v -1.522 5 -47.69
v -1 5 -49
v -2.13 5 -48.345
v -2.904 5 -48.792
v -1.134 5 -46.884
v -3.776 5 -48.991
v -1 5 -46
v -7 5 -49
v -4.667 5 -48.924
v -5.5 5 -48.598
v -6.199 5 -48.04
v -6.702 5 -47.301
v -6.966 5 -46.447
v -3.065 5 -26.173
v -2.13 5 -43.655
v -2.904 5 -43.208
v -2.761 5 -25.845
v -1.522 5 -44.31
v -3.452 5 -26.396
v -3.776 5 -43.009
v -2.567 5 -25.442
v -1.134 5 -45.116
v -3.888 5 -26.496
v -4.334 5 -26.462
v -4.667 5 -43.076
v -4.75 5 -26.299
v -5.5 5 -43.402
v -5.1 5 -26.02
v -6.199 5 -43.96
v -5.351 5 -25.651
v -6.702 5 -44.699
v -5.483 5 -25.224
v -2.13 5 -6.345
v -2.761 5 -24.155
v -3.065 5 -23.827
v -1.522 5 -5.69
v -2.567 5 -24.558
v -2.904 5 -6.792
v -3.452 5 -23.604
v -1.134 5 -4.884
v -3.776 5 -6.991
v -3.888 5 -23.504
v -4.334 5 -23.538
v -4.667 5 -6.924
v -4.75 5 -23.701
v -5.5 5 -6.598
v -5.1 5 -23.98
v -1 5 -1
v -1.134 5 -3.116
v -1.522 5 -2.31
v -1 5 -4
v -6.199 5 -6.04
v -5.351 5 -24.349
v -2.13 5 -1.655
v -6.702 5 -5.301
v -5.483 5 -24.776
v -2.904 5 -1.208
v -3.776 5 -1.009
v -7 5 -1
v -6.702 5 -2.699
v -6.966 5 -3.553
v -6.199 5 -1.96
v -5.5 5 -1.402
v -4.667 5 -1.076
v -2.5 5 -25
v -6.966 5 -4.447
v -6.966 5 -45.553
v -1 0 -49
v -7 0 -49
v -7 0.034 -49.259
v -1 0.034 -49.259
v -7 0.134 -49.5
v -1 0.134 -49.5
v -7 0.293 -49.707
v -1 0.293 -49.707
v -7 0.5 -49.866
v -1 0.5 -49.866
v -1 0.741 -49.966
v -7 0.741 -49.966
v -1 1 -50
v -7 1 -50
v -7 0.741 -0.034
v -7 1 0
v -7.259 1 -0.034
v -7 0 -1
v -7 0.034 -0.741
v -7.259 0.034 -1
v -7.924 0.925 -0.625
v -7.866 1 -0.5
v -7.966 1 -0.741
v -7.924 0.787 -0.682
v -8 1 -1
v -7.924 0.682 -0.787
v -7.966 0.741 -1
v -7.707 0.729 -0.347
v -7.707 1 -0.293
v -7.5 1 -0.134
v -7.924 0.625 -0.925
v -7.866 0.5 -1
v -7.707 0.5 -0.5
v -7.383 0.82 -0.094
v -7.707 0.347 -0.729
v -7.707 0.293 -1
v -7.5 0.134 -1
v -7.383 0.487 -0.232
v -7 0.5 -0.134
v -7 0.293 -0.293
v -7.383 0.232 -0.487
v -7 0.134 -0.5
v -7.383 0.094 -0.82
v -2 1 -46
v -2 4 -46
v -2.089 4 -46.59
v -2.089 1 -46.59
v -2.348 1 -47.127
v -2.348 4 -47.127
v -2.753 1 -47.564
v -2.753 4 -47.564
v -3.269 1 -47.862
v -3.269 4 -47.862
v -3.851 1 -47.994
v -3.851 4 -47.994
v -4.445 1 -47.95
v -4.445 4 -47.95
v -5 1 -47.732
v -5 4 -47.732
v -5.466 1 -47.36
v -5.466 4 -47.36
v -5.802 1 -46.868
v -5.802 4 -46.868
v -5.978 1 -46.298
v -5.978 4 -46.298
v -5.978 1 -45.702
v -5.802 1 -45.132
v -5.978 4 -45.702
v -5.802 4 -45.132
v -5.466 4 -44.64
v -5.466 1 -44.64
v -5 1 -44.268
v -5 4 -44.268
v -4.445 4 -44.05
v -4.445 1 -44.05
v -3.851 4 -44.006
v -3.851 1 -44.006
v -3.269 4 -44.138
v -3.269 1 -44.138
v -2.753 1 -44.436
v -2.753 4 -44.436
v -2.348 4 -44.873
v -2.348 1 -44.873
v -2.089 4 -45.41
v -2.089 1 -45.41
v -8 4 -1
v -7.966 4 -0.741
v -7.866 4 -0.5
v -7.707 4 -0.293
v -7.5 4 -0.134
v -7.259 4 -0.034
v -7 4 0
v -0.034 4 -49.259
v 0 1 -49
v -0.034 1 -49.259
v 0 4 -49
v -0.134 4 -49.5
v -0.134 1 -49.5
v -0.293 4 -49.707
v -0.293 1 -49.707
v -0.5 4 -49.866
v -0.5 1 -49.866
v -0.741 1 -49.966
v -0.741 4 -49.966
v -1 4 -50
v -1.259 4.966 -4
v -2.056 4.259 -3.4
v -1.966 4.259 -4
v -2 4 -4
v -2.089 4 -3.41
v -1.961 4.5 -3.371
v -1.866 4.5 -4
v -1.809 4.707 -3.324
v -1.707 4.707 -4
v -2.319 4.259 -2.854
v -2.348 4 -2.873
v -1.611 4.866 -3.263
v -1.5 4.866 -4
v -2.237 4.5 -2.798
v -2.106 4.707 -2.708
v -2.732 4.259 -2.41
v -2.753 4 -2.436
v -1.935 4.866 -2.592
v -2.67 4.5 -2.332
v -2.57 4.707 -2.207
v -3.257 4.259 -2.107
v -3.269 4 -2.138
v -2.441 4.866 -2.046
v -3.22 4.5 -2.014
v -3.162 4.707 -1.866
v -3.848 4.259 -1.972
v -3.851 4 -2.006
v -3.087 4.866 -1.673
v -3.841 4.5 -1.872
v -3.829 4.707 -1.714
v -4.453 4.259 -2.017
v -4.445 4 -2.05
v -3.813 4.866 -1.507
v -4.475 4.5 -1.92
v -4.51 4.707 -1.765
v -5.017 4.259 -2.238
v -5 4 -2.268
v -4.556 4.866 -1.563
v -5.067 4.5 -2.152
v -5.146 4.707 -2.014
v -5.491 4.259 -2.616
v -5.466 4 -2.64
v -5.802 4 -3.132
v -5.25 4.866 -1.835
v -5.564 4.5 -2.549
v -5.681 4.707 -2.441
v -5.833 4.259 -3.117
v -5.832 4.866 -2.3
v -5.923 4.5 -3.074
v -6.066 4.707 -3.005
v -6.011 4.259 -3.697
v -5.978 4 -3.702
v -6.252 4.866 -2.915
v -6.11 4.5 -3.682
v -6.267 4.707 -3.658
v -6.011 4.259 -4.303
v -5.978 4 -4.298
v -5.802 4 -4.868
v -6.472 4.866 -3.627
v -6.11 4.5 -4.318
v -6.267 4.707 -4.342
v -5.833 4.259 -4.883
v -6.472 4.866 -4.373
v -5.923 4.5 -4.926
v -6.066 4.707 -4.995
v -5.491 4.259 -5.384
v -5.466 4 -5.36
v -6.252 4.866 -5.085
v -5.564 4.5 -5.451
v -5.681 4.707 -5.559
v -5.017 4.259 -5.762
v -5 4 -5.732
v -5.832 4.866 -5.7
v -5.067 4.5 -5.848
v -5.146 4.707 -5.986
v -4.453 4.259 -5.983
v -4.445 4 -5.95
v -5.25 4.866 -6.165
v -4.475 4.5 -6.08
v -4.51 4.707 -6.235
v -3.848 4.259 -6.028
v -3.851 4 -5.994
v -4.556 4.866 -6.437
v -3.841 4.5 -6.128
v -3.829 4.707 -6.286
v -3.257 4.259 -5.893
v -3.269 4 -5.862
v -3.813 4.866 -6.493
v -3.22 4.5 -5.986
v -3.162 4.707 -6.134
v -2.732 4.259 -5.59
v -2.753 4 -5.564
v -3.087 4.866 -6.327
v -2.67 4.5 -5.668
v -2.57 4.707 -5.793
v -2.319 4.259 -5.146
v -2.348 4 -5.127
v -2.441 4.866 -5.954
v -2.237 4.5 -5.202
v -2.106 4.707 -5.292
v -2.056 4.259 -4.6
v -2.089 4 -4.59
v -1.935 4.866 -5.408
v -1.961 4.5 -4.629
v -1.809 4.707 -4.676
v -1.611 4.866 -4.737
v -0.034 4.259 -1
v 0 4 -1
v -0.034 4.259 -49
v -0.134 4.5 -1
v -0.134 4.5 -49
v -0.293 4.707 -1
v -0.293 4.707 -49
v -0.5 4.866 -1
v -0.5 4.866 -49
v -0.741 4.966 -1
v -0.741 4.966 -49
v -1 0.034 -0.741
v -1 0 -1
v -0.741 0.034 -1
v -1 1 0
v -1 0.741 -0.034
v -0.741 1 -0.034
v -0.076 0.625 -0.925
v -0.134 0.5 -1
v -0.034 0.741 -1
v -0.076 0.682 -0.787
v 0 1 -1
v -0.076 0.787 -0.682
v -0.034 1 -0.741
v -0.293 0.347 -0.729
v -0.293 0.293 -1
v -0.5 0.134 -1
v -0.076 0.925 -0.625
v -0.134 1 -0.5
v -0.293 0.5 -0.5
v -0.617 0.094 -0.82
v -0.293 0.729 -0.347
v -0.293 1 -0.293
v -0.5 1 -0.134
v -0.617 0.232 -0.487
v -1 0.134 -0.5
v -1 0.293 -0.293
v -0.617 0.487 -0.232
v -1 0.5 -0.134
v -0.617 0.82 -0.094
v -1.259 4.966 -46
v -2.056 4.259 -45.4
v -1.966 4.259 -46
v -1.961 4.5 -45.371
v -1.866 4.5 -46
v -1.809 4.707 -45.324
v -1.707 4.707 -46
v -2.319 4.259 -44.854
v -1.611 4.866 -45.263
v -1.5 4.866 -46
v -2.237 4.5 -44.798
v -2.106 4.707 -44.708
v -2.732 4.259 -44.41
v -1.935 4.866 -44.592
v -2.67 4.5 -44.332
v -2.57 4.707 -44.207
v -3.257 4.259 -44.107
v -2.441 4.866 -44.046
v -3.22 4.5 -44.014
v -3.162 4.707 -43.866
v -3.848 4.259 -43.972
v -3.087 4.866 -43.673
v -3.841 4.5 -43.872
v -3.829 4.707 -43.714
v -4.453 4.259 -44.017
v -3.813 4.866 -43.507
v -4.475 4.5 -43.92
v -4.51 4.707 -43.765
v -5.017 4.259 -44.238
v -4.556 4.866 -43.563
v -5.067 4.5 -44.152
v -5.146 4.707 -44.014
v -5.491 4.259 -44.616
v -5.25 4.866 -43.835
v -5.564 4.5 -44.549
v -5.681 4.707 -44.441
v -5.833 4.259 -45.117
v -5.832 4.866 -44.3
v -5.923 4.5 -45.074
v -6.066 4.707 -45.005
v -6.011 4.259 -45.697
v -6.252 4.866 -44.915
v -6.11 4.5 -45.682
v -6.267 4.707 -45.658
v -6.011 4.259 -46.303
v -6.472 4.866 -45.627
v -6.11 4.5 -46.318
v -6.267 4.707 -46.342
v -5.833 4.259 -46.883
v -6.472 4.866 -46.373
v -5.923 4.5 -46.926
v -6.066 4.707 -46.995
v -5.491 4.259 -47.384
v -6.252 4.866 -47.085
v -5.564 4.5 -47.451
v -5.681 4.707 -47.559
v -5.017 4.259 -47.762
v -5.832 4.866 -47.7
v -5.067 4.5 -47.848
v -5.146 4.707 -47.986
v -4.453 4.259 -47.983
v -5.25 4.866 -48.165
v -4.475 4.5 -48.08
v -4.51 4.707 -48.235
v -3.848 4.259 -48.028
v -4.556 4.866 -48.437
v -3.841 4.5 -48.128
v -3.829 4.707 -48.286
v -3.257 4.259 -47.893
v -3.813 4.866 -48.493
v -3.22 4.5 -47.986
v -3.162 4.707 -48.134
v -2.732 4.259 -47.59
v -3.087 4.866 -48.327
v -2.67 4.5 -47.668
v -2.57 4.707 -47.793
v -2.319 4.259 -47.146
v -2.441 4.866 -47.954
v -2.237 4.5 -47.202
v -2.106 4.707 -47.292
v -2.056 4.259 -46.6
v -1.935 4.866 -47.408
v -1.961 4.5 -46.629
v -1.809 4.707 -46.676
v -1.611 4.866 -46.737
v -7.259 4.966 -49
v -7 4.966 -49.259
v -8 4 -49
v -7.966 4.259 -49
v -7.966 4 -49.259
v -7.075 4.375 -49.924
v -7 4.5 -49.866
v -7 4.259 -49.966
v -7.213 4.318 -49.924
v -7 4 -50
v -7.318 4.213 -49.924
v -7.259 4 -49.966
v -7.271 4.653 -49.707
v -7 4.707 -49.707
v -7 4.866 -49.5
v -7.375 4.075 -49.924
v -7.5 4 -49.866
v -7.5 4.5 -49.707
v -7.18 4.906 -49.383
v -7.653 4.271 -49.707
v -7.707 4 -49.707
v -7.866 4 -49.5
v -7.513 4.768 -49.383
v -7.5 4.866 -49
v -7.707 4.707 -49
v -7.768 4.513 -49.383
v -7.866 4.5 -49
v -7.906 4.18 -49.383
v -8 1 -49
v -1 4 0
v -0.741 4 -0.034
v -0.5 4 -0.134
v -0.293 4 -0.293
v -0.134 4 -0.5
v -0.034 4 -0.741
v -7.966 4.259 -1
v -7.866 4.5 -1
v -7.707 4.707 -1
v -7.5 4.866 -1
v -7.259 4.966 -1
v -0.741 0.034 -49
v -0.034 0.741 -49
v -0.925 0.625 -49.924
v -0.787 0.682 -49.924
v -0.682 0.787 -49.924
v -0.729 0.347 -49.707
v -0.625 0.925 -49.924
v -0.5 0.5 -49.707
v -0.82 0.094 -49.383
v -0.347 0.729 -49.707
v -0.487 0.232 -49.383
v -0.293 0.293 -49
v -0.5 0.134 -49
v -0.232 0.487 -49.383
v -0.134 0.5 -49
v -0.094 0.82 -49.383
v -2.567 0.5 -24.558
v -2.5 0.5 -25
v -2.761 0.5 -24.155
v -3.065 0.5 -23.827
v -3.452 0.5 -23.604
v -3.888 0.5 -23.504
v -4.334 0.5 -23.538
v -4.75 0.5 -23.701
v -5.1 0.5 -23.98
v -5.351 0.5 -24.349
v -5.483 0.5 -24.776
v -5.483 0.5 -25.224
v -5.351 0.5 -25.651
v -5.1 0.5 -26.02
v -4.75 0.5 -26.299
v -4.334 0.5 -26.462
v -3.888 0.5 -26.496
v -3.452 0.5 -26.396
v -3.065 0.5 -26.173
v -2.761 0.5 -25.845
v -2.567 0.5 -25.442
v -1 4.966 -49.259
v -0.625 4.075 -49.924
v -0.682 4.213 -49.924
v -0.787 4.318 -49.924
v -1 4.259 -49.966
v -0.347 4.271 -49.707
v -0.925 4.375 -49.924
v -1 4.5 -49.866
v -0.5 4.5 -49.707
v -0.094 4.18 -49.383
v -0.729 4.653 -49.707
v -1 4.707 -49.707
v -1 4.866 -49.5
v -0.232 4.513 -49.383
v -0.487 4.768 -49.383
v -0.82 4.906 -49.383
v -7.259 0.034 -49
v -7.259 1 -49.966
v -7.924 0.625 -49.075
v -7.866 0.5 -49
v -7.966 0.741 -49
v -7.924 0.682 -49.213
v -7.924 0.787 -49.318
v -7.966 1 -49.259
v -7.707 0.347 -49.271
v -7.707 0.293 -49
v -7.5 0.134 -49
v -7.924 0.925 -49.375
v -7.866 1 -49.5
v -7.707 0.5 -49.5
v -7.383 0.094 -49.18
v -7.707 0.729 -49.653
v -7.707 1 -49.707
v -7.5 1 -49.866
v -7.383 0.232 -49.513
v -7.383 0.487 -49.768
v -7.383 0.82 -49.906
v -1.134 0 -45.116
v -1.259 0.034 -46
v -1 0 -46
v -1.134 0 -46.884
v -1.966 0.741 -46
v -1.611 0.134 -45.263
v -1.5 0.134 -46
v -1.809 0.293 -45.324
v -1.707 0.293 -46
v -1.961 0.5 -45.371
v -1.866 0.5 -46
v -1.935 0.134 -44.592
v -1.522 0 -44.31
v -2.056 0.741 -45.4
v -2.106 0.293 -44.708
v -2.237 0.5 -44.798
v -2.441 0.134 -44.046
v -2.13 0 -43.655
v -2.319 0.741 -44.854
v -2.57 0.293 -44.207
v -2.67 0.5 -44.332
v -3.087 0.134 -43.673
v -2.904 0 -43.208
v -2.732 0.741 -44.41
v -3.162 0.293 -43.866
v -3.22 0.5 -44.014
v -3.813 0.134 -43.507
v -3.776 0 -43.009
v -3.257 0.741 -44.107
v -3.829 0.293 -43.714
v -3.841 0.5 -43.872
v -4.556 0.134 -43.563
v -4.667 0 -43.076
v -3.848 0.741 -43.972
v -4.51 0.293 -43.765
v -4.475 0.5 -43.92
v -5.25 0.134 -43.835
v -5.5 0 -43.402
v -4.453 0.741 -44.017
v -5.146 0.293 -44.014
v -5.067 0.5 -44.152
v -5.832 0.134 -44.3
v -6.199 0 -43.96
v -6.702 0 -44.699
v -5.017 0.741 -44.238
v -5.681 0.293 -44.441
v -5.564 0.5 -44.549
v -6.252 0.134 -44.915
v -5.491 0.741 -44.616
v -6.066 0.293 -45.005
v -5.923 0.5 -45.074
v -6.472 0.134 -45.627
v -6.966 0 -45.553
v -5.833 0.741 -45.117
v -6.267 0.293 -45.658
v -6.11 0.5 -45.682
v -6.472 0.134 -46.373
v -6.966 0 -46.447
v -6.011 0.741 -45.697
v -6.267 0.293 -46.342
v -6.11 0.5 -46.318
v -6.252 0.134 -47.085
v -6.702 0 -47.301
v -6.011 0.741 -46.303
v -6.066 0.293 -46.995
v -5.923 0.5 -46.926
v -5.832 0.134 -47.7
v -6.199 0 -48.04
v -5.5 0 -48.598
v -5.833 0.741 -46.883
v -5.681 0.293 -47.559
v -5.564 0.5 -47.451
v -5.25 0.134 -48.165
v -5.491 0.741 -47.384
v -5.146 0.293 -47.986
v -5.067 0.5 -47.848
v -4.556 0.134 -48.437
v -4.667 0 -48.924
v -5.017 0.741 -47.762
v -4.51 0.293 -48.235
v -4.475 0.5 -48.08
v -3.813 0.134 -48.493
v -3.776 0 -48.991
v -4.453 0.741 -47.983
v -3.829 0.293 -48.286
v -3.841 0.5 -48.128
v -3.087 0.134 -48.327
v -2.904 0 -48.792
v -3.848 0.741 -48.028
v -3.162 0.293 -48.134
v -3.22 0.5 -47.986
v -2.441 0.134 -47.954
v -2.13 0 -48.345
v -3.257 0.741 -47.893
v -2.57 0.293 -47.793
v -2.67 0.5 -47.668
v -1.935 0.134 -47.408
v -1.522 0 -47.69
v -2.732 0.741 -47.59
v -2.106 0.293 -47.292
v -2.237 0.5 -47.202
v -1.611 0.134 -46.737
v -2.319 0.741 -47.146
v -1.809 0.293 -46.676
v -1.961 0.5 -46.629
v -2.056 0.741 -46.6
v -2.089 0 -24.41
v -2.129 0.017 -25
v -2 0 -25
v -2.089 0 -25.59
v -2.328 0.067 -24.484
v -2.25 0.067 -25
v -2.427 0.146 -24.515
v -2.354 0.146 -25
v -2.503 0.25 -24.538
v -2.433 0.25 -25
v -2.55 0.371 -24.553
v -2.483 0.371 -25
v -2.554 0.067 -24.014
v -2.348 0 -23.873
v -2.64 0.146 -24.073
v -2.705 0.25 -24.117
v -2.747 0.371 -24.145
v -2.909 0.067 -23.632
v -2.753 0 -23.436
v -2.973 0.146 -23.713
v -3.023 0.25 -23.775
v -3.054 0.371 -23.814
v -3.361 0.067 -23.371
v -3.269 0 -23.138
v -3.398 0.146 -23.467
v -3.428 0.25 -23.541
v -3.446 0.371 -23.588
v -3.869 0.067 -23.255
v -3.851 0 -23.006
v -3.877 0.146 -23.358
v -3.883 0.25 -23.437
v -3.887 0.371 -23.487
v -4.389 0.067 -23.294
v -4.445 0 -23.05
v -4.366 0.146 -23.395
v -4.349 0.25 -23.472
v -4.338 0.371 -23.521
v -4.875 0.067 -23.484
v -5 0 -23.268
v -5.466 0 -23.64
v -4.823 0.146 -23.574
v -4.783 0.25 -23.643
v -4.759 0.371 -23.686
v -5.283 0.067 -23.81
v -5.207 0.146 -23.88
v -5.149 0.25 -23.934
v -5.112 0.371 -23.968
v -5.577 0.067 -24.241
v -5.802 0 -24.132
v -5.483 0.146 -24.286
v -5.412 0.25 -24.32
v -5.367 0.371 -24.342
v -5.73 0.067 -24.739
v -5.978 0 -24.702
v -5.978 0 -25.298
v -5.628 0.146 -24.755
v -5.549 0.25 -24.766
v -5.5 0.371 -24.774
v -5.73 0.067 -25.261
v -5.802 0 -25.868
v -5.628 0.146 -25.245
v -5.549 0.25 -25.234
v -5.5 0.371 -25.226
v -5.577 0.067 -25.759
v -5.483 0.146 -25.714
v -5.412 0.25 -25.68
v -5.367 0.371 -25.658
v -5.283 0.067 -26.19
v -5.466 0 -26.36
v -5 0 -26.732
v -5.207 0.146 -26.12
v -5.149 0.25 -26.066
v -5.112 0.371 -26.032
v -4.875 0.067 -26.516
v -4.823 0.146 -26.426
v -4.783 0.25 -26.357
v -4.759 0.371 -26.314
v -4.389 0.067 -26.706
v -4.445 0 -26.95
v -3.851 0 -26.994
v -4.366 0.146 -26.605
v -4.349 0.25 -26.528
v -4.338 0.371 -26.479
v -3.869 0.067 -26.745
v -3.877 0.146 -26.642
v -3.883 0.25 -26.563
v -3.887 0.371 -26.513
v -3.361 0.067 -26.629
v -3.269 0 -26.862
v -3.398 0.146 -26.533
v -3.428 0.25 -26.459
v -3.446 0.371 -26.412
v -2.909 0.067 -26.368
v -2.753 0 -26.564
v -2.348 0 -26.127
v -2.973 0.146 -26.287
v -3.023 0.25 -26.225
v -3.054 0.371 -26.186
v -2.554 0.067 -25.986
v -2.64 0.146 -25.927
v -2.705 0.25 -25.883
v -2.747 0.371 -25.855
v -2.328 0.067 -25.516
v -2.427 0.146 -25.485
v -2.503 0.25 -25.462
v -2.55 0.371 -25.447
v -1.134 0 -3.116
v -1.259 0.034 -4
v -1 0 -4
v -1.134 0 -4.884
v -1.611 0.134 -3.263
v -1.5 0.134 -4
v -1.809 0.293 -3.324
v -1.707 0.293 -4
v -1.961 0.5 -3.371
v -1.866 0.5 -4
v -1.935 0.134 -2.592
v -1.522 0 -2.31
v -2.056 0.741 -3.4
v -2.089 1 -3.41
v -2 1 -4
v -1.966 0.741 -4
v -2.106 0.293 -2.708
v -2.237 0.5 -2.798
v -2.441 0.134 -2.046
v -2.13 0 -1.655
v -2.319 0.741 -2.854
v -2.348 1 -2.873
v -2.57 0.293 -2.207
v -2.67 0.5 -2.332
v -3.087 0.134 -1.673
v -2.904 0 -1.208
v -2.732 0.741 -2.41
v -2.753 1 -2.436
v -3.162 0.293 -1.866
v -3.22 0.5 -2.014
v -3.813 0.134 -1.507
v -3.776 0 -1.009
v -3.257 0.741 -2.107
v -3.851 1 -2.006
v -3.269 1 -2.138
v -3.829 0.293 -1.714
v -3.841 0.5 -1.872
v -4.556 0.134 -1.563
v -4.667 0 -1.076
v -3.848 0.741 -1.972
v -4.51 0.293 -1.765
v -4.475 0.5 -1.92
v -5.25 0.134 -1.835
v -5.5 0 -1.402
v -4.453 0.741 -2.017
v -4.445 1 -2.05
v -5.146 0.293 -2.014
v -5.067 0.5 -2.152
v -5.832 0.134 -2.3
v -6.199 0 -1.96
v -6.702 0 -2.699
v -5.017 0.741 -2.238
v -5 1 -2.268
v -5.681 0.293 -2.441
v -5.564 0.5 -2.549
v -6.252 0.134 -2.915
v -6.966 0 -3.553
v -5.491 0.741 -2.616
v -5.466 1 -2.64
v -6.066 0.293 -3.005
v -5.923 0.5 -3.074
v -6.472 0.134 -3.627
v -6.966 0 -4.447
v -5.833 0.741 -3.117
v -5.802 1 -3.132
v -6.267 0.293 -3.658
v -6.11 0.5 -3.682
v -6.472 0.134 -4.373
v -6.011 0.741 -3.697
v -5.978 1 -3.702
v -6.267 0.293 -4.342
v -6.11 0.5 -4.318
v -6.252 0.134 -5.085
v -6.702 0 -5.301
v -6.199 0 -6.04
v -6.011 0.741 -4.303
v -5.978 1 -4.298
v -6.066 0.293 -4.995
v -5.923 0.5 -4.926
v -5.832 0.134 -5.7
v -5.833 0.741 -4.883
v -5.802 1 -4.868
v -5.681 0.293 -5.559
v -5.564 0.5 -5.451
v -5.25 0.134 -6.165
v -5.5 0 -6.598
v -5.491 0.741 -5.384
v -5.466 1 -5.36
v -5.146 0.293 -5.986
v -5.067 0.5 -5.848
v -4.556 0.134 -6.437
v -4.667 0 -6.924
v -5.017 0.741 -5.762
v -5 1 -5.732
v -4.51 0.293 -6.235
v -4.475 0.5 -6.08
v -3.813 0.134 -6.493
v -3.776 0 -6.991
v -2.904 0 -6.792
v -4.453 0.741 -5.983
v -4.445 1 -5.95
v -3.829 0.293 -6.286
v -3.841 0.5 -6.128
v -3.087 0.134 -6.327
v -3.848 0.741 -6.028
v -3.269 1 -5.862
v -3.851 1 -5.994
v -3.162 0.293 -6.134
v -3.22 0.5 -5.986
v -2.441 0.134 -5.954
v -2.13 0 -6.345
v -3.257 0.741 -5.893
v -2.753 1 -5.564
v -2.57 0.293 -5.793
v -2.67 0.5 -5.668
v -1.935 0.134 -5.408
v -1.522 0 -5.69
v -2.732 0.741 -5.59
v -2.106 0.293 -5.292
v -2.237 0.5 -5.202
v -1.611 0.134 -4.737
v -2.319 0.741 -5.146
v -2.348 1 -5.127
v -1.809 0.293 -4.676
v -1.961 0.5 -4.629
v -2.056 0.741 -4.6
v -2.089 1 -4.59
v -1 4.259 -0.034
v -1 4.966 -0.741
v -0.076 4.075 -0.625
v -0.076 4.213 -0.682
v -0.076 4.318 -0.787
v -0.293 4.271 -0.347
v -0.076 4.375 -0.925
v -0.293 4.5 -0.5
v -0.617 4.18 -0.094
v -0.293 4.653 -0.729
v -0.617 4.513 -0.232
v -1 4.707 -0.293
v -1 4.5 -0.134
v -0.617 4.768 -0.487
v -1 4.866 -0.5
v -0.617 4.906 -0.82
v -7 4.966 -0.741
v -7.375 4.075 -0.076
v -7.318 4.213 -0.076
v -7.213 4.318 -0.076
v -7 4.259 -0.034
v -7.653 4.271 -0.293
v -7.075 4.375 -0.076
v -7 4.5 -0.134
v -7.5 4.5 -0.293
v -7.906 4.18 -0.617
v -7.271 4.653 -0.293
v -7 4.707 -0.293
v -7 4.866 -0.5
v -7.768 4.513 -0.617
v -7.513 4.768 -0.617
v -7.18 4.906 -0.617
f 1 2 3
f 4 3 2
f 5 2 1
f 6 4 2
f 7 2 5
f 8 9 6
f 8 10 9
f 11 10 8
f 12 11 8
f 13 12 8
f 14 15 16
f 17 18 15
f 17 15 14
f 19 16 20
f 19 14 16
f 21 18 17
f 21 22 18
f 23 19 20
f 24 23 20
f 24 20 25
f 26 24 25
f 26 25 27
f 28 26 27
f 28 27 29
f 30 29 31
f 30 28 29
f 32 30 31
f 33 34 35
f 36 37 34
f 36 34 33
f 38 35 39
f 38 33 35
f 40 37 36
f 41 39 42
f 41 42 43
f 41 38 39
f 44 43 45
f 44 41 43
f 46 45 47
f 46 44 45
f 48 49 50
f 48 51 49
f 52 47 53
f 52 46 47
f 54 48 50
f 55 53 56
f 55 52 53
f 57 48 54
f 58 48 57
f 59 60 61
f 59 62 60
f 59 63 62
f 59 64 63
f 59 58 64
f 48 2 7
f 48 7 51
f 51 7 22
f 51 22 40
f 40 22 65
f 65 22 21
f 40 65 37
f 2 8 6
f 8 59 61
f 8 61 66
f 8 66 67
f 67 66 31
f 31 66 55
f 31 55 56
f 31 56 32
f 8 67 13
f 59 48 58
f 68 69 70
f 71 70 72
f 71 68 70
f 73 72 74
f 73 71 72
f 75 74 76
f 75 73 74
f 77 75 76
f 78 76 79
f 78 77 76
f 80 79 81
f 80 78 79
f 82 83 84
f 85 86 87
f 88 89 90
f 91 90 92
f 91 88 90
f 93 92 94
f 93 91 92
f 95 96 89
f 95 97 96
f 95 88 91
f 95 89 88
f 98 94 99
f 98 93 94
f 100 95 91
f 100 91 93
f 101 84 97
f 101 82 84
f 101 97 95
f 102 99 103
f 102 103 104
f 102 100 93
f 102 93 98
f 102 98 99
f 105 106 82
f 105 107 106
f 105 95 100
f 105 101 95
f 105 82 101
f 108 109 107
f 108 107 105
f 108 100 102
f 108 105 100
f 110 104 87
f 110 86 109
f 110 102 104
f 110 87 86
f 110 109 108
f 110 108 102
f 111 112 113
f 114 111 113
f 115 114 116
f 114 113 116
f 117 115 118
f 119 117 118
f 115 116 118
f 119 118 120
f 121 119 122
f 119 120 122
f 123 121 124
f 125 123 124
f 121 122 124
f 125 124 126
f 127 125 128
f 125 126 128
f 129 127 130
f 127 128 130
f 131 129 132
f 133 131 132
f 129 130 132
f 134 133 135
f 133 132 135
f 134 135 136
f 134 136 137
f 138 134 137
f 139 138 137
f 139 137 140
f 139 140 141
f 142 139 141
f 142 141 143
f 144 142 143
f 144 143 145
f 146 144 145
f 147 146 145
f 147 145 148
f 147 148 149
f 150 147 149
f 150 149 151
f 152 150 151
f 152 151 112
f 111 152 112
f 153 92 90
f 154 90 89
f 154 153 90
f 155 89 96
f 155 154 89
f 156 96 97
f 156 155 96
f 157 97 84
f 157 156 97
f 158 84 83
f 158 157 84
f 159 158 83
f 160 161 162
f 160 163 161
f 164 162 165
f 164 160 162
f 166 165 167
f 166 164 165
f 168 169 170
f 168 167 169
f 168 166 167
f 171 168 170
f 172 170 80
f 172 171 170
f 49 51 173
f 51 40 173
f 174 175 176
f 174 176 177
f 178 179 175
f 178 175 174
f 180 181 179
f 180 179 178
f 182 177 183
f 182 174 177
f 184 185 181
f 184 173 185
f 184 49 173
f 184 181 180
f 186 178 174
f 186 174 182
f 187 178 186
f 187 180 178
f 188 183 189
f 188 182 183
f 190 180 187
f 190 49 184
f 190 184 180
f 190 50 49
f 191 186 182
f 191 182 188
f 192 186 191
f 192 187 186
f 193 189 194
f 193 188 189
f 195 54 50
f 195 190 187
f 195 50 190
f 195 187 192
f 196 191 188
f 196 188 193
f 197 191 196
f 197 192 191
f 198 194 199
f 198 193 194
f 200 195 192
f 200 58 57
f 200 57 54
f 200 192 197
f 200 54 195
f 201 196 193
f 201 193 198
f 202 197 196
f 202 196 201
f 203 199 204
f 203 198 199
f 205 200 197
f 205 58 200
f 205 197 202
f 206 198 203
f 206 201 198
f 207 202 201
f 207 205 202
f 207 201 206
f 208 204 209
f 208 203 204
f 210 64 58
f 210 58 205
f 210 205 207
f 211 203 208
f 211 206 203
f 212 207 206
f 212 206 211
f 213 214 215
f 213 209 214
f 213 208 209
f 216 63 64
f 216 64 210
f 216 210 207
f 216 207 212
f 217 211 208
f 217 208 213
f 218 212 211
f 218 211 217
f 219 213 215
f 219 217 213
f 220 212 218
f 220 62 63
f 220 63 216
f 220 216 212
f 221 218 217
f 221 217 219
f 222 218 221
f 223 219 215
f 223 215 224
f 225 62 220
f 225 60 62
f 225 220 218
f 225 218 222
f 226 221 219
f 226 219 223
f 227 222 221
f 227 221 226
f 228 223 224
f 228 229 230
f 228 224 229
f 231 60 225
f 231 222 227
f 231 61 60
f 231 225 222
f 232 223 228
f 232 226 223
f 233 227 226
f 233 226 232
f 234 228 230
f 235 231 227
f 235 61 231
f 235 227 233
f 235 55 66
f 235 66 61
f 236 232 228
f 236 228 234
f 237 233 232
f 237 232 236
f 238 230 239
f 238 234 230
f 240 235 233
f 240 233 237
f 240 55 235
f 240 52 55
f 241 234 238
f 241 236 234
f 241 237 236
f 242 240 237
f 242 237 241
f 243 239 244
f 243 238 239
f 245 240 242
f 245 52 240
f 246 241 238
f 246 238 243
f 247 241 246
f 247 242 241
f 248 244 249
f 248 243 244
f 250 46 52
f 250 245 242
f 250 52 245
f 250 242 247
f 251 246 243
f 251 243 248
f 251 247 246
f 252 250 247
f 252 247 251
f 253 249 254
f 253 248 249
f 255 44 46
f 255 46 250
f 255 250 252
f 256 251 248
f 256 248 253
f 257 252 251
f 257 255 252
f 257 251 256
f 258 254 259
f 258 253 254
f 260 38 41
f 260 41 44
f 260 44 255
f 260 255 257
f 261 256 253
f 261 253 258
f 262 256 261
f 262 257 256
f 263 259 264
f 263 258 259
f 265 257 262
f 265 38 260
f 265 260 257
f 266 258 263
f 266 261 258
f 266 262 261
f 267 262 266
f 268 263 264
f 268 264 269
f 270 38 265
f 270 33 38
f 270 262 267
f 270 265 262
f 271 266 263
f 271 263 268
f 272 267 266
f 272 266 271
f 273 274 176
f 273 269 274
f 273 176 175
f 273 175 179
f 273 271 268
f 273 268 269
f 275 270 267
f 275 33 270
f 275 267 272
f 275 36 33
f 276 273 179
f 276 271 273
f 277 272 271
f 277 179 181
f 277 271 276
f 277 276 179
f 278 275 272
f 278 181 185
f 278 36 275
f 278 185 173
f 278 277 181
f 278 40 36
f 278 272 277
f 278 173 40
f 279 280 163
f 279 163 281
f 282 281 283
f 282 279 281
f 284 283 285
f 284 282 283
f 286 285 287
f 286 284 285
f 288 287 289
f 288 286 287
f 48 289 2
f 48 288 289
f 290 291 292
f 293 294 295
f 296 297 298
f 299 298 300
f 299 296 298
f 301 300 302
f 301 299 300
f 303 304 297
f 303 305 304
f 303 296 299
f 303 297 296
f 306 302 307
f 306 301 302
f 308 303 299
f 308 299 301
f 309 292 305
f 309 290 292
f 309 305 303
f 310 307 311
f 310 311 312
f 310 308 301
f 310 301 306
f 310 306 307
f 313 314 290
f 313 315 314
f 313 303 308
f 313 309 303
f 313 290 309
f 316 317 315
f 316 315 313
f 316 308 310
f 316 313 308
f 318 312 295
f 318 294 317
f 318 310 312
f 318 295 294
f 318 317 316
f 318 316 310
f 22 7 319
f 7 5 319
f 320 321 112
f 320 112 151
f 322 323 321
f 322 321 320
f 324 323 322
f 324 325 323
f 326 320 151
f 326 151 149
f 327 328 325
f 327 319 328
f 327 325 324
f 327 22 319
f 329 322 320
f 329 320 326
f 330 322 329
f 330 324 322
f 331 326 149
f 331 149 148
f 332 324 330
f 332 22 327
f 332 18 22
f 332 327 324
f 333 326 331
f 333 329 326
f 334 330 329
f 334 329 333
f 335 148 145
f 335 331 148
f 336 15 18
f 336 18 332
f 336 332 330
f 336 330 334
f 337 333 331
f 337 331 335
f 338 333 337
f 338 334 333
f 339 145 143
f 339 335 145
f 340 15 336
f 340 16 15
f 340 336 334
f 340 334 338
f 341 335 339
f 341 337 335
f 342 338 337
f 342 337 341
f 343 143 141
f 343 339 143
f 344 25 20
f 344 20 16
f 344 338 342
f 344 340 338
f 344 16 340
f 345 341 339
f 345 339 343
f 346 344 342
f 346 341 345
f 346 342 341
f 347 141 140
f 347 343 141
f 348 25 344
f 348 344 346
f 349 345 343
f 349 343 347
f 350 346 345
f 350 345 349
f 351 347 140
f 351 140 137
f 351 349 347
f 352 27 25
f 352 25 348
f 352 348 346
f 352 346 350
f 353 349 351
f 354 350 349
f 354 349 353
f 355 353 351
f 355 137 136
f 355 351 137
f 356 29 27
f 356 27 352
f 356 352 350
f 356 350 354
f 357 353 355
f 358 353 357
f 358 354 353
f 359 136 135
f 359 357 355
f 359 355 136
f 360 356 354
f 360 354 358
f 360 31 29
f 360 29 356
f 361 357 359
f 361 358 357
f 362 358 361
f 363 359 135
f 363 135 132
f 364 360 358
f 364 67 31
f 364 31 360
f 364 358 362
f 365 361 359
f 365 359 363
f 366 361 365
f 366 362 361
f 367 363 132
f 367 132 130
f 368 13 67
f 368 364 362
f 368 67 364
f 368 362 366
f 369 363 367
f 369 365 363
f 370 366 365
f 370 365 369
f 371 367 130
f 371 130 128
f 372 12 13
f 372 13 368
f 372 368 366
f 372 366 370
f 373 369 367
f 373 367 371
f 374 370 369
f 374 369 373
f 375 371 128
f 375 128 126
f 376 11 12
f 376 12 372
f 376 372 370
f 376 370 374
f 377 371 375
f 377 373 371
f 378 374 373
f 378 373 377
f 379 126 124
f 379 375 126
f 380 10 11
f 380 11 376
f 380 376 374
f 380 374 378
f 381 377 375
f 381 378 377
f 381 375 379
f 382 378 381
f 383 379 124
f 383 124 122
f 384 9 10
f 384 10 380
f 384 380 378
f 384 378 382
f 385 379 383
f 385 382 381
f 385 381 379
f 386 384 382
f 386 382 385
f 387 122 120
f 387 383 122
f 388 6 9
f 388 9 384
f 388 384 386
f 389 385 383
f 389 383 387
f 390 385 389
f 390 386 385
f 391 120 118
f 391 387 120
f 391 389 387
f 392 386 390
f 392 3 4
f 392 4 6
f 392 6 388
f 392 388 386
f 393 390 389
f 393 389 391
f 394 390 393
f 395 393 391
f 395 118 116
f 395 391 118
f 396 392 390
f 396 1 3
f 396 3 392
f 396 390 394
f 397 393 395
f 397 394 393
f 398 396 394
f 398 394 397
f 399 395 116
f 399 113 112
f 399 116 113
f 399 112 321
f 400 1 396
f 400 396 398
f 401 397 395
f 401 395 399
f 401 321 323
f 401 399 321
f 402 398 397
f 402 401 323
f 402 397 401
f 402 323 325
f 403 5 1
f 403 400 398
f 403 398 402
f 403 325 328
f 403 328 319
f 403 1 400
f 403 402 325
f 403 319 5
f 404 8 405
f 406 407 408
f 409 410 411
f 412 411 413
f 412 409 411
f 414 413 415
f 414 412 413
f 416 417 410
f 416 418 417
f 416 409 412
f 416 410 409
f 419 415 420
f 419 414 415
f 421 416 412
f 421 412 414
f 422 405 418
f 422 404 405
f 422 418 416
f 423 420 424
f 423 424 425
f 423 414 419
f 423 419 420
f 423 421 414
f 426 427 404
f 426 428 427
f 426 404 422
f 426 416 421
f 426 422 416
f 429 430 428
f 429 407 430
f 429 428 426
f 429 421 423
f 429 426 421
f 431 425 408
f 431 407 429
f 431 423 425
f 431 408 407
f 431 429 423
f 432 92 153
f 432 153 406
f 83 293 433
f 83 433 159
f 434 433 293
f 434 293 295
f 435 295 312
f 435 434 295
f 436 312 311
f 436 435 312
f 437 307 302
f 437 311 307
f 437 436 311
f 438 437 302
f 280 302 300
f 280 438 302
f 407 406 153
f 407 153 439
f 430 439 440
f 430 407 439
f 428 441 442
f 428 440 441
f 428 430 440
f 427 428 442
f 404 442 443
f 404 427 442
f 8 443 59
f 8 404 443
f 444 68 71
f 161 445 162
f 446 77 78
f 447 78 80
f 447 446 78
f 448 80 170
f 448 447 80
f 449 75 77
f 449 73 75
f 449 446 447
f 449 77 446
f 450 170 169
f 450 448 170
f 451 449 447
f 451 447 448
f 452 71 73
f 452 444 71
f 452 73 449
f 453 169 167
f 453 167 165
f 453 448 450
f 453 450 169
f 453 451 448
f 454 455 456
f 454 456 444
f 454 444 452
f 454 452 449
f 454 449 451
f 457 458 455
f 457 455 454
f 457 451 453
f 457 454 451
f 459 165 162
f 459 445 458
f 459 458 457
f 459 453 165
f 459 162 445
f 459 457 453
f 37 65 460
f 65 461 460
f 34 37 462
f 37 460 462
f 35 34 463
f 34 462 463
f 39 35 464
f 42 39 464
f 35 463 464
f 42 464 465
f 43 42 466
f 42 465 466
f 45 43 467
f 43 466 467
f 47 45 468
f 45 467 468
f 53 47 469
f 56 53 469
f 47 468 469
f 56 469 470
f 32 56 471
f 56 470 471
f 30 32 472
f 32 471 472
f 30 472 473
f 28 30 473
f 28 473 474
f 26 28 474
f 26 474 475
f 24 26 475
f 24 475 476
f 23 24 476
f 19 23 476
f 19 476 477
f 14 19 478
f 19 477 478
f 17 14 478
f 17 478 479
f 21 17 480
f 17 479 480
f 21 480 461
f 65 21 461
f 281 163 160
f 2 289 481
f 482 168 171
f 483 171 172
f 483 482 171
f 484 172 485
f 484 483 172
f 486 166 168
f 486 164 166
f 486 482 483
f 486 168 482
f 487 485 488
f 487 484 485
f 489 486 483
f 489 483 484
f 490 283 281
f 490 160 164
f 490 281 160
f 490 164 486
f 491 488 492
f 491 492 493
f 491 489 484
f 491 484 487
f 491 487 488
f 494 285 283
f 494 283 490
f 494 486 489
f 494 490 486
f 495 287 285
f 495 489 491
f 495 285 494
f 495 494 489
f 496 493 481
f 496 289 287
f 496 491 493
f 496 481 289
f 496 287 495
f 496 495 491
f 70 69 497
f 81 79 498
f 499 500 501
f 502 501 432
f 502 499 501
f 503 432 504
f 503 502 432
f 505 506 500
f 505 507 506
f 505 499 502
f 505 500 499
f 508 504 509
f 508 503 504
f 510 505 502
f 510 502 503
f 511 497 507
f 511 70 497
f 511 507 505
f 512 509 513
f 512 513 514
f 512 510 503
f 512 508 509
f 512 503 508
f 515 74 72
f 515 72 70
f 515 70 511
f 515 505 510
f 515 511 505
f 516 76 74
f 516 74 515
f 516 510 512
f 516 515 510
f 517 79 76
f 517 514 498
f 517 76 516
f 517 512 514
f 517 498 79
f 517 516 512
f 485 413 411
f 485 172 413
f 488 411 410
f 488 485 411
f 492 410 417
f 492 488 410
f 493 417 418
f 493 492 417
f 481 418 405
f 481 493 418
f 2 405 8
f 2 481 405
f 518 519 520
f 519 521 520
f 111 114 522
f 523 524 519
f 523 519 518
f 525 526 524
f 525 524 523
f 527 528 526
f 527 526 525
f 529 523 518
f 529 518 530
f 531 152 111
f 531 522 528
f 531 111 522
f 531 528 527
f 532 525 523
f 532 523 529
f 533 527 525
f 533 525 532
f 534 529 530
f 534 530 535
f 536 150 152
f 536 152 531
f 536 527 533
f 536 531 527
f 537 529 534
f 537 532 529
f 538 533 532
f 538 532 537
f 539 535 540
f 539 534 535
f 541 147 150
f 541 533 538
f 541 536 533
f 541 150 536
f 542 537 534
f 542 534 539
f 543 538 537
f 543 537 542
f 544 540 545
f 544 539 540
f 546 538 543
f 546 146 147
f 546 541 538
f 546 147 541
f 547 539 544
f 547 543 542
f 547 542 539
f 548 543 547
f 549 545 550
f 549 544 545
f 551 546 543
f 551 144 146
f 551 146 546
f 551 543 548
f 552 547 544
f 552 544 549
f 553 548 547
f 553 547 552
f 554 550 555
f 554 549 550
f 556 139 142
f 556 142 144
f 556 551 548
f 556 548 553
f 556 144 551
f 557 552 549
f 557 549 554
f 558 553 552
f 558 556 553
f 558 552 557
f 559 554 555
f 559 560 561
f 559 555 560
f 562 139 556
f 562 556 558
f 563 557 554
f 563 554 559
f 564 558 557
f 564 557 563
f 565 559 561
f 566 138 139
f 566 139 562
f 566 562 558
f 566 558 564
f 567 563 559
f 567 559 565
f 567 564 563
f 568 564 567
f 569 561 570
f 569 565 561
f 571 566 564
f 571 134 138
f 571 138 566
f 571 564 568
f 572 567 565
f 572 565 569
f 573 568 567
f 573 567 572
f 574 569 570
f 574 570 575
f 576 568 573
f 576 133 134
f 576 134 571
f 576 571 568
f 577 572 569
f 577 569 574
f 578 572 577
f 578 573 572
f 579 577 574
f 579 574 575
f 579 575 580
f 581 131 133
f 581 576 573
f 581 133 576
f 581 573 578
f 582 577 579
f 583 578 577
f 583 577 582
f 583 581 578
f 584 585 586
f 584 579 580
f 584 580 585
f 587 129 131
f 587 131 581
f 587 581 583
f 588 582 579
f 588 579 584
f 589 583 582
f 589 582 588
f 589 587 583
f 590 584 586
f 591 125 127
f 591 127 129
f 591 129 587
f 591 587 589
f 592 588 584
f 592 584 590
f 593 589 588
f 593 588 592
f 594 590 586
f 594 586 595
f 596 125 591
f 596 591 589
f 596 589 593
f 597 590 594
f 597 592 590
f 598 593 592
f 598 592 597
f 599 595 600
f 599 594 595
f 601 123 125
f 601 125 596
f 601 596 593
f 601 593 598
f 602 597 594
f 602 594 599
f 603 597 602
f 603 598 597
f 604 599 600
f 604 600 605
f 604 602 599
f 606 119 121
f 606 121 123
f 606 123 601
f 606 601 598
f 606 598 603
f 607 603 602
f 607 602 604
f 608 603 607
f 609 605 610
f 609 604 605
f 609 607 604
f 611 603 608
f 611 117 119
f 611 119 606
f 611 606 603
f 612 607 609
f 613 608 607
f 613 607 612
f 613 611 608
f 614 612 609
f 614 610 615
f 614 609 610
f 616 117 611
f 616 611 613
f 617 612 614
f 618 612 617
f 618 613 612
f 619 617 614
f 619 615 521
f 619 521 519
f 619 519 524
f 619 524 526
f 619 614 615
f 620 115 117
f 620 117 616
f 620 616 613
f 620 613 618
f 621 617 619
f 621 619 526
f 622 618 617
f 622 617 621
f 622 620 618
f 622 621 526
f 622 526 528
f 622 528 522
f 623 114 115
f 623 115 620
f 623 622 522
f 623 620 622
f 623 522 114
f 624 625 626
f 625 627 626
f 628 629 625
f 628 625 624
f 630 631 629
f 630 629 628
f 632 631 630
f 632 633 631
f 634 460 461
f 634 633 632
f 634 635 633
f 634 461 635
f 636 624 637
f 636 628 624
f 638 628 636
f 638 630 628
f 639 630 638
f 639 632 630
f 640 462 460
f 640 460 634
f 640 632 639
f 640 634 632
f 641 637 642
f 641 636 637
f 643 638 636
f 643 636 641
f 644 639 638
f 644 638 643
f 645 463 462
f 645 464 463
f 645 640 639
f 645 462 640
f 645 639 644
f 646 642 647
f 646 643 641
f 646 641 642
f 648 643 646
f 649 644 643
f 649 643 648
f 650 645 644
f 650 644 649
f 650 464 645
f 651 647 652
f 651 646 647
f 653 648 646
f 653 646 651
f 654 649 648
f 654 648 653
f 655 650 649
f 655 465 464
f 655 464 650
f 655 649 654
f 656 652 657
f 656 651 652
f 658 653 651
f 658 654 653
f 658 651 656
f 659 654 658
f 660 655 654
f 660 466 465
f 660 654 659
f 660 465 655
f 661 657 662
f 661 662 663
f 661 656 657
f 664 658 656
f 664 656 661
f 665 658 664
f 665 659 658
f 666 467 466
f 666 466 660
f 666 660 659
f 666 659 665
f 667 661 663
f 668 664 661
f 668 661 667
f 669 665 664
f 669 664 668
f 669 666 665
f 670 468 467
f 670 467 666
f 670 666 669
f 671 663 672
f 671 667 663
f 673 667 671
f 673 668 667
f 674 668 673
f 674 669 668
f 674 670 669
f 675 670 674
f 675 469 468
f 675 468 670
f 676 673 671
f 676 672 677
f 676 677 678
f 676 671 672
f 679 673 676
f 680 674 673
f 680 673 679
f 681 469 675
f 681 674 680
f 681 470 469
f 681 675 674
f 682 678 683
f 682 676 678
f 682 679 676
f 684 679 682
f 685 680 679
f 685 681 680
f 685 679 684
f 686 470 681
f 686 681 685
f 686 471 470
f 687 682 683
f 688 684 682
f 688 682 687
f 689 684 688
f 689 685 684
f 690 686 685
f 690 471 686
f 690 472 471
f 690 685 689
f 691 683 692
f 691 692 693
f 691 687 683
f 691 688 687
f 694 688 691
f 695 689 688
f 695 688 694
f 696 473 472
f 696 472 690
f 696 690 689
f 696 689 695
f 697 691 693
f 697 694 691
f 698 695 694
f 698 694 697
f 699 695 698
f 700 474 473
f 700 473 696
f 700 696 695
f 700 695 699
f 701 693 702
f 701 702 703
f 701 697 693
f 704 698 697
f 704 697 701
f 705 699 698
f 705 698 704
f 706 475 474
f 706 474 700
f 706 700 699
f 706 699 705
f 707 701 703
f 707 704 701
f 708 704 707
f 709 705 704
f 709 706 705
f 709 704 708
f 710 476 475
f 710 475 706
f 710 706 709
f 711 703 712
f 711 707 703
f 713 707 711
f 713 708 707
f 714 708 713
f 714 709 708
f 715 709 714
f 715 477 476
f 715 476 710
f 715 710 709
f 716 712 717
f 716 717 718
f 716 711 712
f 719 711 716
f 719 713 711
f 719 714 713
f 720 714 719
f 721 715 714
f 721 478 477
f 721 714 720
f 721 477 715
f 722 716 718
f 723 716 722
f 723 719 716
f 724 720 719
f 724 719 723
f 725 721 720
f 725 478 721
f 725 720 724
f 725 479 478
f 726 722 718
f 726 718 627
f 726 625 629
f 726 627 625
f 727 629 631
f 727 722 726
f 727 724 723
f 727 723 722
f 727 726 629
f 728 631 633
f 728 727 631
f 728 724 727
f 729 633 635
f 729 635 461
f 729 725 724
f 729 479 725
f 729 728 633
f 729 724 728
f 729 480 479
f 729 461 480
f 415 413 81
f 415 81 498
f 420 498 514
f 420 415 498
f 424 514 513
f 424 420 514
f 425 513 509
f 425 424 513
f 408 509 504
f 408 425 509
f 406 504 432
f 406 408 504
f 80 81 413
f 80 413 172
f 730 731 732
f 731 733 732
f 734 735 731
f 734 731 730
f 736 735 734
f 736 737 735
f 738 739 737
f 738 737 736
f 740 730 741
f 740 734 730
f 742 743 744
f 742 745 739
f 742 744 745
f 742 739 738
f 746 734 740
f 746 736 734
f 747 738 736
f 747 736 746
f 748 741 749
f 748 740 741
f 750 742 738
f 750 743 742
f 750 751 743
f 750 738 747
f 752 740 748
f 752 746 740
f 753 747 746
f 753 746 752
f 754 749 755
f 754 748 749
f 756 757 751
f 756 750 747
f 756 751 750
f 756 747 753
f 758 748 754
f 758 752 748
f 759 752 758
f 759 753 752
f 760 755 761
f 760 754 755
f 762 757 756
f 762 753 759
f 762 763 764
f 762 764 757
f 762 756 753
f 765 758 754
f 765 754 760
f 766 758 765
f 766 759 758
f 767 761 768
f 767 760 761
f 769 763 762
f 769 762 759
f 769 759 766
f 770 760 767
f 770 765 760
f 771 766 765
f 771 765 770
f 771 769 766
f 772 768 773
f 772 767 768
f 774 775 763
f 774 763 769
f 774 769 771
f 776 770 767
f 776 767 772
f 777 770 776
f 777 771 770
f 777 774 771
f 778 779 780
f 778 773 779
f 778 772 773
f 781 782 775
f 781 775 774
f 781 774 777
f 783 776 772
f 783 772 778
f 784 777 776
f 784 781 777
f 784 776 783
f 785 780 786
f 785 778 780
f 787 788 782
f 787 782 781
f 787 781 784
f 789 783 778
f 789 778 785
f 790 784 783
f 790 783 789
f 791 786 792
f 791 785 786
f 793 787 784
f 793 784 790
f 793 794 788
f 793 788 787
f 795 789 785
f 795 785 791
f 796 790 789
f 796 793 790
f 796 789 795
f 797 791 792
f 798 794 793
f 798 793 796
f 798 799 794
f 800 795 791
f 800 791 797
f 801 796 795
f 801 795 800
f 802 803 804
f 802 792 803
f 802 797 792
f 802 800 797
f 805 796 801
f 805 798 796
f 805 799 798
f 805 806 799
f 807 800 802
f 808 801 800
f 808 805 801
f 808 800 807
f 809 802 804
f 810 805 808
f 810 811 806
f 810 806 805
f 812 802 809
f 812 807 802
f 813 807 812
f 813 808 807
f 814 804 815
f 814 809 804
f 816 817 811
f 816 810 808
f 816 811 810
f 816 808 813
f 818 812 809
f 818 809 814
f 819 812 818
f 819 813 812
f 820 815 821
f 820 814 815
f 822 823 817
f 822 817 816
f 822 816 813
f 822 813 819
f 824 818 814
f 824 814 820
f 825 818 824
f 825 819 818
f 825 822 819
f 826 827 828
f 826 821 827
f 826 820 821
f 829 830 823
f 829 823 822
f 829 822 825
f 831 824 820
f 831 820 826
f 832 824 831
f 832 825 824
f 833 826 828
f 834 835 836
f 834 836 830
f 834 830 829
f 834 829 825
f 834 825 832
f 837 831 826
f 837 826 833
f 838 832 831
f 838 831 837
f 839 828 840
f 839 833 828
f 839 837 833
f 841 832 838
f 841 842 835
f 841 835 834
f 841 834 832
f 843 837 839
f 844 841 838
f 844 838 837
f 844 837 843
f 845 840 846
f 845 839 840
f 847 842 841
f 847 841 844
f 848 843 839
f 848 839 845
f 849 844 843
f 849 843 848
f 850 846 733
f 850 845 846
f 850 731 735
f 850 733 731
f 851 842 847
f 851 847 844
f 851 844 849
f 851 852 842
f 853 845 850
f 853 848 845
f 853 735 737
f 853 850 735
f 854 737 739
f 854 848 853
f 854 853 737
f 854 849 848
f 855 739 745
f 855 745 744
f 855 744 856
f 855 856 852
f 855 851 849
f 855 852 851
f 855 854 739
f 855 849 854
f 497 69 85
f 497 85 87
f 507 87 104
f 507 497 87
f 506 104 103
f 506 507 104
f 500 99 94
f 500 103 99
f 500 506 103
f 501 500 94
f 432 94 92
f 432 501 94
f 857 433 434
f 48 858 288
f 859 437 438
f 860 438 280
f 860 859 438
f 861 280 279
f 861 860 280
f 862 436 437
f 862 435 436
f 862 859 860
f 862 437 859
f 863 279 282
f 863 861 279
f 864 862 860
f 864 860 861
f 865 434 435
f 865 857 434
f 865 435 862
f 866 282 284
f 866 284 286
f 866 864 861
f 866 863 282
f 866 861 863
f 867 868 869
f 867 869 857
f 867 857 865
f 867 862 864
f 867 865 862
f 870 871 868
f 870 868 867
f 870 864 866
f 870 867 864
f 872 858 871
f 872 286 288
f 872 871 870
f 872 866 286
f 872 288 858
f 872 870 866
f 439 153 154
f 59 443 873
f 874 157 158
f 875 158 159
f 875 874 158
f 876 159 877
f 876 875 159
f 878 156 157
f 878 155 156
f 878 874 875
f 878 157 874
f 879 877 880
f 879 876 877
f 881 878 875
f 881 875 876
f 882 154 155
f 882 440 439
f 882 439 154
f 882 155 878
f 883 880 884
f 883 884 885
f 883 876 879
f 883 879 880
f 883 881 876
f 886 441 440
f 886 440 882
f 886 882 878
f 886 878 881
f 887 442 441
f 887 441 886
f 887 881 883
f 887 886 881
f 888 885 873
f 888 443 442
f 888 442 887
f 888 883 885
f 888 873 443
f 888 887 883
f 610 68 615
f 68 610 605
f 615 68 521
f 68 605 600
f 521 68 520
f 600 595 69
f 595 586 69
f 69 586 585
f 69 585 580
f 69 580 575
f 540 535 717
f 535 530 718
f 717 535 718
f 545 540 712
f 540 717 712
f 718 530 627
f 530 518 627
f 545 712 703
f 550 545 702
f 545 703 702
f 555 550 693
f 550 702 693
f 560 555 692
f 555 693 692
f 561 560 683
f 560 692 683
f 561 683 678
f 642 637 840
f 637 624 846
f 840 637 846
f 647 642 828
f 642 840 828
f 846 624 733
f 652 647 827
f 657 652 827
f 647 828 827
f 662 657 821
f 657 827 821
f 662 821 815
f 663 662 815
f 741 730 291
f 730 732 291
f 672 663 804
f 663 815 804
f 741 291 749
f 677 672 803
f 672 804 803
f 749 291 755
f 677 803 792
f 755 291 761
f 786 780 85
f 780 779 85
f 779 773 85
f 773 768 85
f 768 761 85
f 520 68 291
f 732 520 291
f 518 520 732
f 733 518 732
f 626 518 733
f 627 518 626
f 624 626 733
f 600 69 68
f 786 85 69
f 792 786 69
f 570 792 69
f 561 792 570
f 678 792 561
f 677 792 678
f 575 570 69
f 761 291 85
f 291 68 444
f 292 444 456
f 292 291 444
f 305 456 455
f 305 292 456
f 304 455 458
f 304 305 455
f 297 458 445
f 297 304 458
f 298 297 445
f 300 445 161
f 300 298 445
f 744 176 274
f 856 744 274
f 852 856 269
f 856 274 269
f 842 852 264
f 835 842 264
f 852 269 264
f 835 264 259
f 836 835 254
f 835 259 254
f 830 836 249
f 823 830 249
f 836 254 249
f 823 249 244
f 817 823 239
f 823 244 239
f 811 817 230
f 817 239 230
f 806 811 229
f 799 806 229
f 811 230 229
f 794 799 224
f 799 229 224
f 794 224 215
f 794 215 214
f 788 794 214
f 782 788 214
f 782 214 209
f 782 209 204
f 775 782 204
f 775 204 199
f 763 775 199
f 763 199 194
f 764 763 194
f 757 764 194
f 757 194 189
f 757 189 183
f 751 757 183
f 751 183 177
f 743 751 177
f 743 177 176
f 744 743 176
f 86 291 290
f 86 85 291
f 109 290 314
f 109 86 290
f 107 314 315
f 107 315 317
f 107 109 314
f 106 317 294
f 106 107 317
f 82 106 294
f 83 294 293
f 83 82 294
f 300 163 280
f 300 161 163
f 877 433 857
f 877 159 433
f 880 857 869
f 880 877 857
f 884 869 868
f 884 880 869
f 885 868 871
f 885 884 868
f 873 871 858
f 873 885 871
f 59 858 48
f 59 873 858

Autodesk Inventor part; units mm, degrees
ref_plane "YZ Plane" through (0, 0, 0) normal (1, 0, 0) x (0, 1, 0)
ref_plane "XZ Plane" through (0, 0, 0) normal (0, 1, 0) x (-1, 0, 0)
ref_plane "XY Plane" through (0, 0, 0) normal (0, 0, 1) x (1, 0, 0)
sketch "스케치1" plane through (0, 0, 0) normal (0, 1, 0) x (-1, 0, 0)
  line L0 (0, 0) -> (8, 0)
  line L1 (8, 0) -> (8, -50)
  line L2 (8, -50) -> (0, -50)
  line L3 (0, -50) -> (0, 0)
  dimension "d0" = 50
  dimension "d1" = 8
extrude "돌출1" add sketch "스케치1" along normal blind 5
sketch "스케치2" plane through (0, 5, 0) normal (0, 1, 0) x (1, 0, 0)
  circle A0 centre (-4, 4) radius 2
  line L0 (-8, 50) -> (-8, 0) projected
  line L1 (-8, 0) -> (0, 0) projected
  circle A1 centre (-4, 46) radius 2
  line L2 (0, 0) -> (0, 50) projected
  line L3 (0, 50) -> (-8, 50) projected
  dimension "d4" = 4
  dimension "d5" = 4
  dimension "d6" = 4
  dimension "d7" = 4
  dimension "d8" = 4
  dimension "d9" = 4
sketch "스케치3" plane through (0, 0, 0) normal (0, -1, 0) x (1, 0, 0)
  circle A0 centre (-4, -25) radius 1.5
  line L0 (-8, -50) -> (0, -50) projected
  line L1 (0, -50) -> (0, 0) projected
  dimension "d10" = 3
  dimension "d11" = 25
  dimension "d12" = 4
extrude "돌출2" cut sketch "스케치2" against normal blind 5 contours A0 | A1
extrude "돌출3" cut sketch "스케치3" against normal blind 5
fillet "모깎기1" radius 1 12 edges at (-8, 5, -25) (-4, 5, 0) (0, 5, -25) (-4, 0, 0) (0, 0, -25) (0, 2.5, 0) (-8, 2.5, 0) (0, 2.5, -50) (-4, 5, -50) (-4, 0, -50) (-8, 2.5, -50) (-8, 0, -25)
fillet "모깎기2" radius 0.5 1 edges at (-5.5, 0, -25)
fillet "모깎기3" radius 1 4 edges at (-6, 0, -46) (-6, 0, -4) (-6, 5, -4) (-6, 5, -46)
properties part number "핸들"
